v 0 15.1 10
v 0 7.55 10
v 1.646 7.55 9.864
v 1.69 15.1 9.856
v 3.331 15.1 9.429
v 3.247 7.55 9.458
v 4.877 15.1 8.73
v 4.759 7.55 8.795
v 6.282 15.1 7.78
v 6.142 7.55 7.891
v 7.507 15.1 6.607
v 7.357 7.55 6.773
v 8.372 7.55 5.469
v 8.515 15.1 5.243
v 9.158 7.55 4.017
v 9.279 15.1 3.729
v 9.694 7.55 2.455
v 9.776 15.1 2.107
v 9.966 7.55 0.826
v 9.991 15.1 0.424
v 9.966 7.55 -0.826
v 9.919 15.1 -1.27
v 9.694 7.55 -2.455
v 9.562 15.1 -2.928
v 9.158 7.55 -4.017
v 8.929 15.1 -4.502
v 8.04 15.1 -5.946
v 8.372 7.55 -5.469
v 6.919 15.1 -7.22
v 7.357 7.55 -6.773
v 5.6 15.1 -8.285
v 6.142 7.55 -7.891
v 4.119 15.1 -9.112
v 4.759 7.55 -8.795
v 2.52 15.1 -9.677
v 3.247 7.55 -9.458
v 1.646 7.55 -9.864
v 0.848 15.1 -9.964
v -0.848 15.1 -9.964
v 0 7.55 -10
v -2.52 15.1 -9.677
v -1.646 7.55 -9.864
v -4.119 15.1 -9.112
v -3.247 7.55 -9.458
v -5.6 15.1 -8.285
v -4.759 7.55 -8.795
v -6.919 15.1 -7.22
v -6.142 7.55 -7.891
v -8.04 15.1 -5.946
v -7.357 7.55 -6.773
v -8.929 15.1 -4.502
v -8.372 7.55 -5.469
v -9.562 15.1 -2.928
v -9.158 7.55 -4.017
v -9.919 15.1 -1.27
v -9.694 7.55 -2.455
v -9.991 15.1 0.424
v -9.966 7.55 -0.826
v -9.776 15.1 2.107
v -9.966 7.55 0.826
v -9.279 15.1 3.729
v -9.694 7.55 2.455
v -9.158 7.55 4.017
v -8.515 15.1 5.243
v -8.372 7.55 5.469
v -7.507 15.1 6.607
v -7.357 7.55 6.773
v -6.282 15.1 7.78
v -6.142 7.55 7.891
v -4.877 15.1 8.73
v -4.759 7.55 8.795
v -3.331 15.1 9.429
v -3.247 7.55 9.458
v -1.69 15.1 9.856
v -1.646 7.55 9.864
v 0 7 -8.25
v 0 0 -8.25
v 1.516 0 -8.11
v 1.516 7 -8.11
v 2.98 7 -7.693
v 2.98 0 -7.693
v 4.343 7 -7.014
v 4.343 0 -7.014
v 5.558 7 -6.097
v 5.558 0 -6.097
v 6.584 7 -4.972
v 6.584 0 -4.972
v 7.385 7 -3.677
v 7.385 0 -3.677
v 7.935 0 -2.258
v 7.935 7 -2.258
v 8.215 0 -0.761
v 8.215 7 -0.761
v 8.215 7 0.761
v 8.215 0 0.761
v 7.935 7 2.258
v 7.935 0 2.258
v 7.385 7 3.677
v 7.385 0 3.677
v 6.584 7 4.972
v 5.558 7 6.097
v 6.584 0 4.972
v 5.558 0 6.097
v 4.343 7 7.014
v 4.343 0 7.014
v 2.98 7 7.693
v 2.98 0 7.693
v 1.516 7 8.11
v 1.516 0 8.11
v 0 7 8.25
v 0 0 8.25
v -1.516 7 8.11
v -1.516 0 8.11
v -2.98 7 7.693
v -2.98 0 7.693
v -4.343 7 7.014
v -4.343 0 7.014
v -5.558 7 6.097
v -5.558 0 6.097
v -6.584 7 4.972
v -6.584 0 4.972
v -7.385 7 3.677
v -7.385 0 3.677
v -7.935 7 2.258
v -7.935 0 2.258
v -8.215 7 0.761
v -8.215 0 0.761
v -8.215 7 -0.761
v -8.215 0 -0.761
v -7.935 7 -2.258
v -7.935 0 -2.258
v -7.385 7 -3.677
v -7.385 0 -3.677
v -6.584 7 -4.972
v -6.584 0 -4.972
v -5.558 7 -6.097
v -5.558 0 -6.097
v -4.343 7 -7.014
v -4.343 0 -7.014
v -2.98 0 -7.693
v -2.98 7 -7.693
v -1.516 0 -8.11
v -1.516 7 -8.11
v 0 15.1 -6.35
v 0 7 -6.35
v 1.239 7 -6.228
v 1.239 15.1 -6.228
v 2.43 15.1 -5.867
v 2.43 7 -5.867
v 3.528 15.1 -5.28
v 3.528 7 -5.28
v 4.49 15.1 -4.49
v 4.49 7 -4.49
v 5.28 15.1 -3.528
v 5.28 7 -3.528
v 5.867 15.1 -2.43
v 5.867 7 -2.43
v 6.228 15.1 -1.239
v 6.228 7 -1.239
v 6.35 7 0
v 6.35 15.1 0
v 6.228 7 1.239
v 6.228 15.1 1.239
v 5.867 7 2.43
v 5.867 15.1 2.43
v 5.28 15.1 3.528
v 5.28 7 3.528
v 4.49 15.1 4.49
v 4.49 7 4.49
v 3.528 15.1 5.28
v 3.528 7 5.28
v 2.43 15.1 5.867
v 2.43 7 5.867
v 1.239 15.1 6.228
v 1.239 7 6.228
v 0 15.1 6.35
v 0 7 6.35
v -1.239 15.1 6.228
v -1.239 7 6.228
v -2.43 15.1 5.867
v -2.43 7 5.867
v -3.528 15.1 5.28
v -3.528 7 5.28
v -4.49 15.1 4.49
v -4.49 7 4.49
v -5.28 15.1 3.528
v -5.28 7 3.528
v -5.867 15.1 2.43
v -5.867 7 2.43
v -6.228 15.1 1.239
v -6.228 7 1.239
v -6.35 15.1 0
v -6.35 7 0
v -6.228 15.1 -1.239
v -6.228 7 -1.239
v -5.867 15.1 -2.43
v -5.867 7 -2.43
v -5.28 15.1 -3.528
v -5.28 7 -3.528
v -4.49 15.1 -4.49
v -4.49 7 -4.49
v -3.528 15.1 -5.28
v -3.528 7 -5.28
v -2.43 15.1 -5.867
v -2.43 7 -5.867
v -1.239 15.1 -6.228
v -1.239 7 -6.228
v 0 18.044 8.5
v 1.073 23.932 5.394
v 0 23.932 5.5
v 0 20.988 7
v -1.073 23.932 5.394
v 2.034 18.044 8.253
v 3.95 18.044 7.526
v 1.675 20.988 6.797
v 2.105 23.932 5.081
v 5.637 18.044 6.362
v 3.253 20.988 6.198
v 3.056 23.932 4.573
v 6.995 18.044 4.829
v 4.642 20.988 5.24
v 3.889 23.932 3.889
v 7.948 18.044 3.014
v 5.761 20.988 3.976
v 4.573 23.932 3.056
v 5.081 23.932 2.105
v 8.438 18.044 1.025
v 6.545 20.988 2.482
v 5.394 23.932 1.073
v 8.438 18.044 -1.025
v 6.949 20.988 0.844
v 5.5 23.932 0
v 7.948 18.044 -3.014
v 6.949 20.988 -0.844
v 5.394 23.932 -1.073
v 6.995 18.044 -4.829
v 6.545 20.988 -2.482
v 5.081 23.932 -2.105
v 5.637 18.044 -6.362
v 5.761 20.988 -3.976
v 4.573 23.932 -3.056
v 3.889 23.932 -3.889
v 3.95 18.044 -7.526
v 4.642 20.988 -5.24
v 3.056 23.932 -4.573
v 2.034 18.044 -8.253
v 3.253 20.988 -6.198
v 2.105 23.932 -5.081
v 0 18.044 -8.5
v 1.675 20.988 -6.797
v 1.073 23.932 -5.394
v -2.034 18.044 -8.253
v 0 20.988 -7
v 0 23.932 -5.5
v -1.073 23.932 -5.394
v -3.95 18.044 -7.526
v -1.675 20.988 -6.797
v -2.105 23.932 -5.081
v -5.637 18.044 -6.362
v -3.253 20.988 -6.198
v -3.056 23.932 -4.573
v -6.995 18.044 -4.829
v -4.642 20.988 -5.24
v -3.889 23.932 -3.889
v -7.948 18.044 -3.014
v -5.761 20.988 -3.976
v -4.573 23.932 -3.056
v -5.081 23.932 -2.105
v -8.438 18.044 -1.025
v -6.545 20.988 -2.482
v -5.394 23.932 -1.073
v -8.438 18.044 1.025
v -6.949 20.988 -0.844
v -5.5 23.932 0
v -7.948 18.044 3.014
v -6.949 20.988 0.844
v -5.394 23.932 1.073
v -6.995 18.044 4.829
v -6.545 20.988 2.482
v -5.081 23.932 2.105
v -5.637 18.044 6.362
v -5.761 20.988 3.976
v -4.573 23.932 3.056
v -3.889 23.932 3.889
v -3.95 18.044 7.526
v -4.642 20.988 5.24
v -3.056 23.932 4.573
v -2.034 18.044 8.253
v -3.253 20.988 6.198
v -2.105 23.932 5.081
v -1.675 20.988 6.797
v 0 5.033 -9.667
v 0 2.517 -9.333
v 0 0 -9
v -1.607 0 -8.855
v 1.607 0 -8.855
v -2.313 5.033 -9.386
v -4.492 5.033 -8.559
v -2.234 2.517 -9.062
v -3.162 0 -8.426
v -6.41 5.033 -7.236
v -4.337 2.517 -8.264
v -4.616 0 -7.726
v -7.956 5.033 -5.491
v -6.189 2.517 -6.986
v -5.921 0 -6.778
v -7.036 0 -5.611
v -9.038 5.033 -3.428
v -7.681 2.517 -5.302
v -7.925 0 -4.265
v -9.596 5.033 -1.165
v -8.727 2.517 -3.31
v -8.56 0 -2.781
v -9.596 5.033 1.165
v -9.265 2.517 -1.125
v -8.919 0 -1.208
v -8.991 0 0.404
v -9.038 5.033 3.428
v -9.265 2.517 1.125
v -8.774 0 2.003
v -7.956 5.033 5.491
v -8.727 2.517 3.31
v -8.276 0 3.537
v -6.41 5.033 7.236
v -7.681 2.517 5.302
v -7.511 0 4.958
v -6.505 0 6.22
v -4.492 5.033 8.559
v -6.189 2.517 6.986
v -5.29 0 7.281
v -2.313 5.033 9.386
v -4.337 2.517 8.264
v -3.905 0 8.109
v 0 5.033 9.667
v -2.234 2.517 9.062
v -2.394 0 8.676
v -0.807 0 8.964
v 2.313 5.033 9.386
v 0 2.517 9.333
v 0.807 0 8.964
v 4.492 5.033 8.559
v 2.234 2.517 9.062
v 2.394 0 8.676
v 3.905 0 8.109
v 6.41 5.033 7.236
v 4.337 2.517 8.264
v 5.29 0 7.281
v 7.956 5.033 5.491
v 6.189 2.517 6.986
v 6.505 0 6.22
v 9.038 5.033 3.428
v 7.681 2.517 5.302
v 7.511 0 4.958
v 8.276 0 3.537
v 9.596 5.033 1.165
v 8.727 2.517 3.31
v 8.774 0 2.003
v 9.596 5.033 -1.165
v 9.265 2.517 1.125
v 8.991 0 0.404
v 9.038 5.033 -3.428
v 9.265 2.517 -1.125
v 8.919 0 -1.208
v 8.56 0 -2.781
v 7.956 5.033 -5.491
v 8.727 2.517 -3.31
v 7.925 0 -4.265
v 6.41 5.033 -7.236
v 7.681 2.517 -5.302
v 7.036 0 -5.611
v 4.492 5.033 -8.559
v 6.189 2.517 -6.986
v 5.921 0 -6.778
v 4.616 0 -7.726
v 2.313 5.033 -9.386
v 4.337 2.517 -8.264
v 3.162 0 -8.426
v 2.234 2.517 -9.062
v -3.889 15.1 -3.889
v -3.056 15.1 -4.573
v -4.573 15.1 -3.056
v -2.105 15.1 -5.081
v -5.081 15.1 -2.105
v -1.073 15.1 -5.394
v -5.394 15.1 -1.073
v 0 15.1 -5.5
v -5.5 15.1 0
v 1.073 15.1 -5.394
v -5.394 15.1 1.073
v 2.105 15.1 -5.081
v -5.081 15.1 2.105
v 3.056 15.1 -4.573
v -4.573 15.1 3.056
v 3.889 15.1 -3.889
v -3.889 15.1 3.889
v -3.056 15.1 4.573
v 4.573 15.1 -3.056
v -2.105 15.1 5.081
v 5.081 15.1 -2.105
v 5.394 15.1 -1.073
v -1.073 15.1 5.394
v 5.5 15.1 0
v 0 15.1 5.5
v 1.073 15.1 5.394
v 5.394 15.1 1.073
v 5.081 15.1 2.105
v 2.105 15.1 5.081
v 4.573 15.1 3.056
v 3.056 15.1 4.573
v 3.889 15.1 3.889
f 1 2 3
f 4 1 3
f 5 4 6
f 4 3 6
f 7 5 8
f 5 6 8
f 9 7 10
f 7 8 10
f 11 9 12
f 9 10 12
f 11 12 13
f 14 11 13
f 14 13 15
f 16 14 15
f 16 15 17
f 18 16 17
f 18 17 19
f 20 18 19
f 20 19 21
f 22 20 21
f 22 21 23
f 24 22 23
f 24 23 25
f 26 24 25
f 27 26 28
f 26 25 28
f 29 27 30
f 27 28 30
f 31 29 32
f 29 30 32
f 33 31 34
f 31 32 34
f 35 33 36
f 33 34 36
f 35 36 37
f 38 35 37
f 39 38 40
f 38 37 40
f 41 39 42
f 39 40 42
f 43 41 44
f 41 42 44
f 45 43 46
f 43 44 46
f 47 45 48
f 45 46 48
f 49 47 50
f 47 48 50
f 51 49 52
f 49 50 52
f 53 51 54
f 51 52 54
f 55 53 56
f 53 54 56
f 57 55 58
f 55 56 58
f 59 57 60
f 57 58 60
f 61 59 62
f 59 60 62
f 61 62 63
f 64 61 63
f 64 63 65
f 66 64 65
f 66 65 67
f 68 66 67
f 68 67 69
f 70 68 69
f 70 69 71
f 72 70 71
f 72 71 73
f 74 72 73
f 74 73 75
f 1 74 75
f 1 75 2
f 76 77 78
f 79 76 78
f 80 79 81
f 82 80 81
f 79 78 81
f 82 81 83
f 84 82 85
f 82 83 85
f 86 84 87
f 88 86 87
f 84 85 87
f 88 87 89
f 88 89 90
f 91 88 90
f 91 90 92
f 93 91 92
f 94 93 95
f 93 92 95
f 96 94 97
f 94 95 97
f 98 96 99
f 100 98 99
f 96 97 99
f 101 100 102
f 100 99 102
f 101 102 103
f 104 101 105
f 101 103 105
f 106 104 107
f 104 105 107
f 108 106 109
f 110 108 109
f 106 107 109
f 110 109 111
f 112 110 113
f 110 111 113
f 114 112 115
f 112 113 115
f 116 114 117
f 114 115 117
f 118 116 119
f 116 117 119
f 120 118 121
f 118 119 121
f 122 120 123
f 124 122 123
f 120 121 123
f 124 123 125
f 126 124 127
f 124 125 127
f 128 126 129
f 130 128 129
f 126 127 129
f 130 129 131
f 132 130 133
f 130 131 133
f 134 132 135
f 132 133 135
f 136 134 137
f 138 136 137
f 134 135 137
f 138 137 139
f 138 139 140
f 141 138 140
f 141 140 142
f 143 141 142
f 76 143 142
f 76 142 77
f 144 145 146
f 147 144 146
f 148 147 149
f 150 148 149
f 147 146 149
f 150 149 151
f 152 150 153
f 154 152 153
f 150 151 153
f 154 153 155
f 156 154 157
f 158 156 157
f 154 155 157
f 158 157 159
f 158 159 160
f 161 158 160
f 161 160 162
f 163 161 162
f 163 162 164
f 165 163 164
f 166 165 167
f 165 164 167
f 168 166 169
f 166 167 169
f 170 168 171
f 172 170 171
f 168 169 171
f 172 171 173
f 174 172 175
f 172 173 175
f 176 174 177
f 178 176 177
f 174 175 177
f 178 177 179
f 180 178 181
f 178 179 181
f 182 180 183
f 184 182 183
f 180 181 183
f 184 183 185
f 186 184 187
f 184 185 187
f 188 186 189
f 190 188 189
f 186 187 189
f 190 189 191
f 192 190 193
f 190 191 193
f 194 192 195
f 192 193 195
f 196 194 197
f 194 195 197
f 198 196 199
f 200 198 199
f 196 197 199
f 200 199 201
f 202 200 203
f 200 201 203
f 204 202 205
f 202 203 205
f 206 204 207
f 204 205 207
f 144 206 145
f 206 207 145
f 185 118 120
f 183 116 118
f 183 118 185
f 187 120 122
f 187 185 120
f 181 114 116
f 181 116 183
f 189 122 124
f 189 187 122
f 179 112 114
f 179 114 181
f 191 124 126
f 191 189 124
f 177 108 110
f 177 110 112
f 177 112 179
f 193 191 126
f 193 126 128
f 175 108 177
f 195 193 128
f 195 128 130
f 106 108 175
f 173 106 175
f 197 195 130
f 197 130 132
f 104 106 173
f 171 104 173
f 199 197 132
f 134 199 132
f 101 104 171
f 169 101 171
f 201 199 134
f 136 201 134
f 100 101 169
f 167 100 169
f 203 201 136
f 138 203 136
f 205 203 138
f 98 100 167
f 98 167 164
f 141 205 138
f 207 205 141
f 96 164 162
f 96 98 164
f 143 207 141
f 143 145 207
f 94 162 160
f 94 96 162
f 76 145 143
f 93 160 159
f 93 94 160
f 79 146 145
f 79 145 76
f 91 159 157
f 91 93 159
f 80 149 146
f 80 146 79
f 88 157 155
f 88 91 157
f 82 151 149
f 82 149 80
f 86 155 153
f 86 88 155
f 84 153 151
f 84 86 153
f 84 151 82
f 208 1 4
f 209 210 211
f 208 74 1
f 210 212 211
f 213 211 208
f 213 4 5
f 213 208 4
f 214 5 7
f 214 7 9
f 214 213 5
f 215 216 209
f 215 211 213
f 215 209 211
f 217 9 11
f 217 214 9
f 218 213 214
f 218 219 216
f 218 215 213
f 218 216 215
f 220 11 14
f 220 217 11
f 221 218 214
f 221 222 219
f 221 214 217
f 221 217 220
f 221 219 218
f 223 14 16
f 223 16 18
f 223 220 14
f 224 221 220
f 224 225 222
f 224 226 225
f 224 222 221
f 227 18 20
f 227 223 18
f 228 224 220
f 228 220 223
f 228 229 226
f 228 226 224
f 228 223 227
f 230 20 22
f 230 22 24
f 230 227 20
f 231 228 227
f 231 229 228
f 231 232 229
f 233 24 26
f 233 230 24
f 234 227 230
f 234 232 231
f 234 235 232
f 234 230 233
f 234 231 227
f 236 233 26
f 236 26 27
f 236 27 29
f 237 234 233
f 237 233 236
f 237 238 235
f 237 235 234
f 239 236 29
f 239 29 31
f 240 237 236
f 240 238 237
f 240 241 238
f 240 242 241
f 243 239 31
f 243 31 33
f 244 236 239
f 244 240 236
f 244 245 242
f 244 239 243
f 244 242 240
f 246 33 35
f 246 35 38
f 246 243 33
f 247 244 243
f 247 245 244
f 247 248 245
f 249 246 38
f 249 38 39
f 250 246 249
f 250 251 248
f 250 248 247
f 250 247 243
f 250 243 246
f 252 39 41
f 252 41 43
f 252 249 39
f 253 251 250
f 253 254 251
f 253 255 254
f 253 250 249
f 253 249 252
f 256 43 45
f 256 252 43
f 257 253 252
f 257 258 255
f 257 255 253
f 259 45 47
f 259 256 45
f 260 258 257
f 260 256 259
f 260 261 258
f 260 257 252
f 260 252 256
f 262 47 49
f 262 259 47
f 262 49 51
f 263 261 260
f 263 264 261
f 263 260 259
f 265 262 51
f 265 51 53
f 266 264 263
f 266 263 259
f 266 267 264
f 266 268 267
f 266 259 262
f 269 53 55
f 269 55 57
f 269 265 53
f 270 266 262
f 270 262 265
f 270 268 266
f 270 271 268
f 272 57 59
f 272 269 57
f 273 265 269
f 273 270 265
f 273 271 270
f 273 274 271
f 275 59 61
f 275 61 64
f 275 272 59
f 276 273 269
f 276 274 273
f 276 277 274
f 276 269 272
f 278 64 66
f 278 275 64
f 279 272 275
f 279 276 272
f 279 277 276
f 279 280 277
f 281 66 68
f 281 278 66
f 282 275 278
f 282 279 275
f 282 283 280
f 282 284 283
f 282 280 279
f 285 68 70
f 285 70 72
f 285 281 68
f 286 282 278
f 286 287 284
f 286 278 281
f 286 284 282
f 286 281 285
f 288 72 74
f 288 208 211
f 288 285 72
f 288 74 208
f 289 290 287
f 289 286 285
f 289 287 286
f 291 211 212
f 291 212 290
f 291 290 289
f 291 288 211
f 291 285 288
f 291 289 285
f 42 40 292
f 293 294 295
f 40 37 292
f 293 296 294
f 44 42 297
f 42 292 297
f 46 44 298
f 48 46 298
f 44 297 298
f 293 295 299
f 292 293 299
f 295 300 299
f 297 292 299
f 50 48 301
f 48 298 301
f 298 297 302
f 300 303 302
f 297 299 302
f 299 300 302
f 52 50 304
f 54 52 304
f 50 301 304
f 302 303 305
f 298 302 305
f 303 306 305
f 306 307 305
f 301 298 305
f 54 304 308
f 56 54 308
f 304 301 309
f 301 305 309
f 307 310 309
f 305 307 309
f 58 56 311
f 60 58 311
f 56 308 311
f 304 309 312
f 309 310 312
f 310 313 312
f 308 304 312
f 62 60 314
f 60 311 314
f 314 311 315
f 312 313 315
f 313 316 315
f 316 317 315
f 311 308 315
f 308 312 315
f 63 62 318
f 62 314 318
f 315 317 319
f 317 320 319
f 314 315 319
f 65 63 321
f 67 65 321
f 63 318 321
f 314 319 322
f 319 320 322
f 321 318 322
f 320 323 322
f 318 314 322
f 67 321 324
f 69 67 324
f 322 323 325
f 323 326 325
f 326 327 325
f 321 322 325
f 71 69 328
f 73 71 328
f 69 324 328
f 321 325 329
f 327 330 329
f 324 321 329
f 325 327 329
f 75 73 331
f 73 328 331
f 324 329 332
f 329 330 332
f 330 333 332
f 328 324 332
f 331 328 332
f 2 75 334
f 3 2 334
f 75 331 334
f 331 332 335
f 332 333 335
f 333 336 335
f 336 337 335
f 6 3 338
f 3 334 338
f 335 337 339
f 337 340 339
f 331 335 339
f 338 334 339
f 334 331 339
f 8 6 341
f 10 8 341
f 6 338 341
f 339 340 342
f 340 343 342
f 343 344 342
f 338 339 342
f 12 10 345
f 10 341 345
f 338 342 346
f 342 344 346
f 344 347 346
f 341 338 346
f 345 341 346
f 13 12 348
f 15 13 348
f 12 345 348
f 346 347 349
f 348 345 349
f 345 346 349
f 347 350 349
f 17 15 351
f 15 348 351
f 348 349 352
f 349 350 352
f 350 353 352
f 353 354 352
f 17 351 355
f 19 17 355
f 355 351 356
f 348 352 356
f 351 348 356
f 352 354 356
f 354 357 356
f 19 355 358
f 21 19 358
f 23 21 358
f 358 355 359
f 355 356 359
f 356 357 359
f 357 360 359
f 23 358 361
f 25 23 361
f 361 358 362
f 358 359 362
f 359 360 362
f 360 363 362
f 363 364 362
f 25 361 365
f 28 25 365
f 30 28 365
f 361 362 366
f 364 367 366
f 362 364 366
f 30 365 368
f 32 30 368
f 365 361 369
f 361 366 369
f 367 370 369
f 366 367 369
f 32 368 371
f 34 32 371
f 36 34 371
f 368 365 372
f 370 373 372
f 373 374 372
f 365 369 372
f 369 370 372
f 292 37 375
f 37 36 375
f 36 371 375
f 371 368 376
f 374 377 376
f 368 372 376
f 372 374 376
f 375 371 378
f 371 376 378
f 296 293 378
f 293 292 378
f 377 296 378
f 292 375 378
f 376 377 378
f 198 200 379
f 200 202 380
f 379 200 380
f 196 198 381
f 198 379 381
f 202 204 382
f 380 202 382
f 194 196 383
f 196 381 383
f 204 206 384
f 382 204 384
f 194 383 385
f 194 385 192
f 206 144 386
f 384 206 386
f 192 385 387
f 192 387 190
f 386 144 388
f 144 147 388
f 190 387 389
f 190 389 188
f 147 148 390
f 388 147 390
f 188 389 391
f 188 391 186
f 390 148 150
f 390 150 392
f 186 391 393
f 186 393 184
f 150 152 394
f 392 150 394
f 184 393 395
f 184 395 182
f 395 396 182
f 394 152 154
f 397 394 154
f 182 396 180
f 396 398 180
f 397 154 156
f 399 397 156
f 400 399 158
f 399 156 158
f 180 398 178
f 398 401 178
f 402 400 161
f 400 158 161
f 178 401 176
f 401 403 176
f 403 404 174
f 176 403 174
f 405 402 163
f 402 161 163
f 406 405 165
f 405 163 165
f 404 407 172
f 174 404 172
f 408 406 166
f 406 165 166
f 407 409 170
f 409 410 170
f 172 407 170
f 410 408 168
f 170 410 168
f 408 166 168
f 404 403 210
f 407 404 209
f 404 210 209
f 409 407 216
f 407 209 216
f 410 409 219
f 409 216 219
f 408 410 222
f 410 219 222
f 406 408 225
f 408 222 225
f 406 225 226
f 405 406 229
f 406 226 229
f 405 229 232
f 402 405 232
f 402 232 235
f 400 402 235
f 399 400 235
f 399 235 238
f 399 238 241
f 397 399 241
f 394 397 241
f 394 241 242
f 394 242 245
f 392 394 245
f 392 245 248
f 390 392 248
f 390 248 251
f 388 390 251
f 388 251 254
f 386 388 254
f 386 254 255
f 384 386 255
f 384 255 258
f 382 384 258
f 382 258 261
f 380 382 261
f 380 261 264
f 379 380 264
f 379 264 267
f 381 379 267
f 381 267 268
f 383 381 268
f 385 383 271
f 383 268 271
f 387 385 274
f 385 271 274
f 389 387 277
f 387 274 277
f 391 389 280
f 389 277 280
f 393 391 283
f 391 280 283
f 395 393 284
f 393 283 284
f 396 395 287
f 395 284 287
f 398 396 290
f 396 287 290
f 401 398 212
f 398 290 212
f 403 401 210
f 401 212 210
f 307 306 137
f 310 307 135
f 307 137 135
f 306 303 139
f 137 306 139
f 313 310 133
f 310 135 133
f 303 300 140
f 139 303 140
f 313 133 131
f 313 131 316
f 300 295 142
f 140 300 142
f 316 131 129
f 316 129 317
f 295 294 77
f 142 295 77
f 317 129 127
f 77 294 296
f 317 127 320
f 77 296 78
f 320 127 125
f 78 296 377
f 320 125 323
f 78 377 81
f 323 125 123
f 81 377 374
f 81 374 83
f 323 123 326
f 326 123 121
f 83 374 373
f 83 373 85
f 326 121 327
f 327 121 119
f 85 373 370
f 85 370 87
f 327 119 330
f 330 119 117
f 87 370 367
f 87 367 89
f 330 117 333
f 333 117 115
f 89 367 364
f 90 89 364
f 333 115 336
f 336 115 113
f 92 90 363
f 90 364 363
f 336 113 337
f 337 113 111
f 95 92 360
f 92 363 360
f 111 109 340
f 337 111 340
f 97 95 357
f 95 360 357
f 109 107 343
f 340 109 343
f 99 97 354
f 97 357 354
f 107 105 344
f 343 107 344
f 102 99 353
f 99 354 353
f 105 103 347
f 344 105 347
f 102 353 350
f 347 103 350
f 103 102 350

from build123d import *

# Parameters (mm, degrees)
SKETCH1_R           = 10
BOSS_EXTRUDE1_DEPTH = 15.1
SKETCH2_R           = 8.25
CUT_EXTRUDE1_DEPTH  = 7
SKETCH3_R           = 6.35
CUT_EXTRUDE2_DEPTH  = 8.1
SKETCH7_R           = 10
BOSS_EXTRUDE2_DEPTH = 10
BOSS_EXTRUDE2_TAPER = 27
SKETCH8_R           = 5.5
CUT_EXTRUDE3_DEPTH  = 10


with BuildPart() as part:
    # Sketch1 → Boss-Extrude1 (new body)
    with BuildSketch(Plane(origin=(0, 0, 0), x_dir=(1, 0, 0), z_dir=(0, 1, 0))):
        with Locations(Location((0, 0, 0), (0, 0, 270))):
            Circle(SKETCH1_R)
    extrude(amount=BOSS_EXTRUDE1_DEPTH)

    # Sketch2 → Cut-Extrude1 (cut)
    with BuildSketch(Plane(origin=(0, 0, 0), x_dir=(-1, 0, 0), z_dir=(0, -1, 0))):
        with Locations(Location((0, 0, 0), (0, 0, 90))):
            Circle(SKETCH2_R)
    extrude(amount=-CUT_EXTRUDE1_DEPTH, mode=Mode.SUBTRACT)

    # Sketch3 → Cut-Extrude2 (cut)
    with BuildSketch(Plane.XZ.offset(-7)):
        with Locations(Location((0, 0, 0), (0, 0, 270))):
            Circle(SKETCH3_R)
    extrude(amount=-CUT_EXTRUDE2_DEPTH, mode=Mode.SUBTRACT)

    # Sketch7 → Boss-Extrude2 (add)
    with BuildSketch(Plane(origin=(0, 15.1, 0), x_dir=(1, 0, 0), z_dir=(0, 1, 0))):
        with Locations(Location((0, 0, 0), (0, 0, 270))):
            Circle(SKETCH7_R)
    extrude(amount=BOSS_EXTRUDE2_DEPTH, taper=BOSS_EXTRUDE2_TAPER)

    # Sketch8 → Cut-Extrude3 (cut)
    with BuildSketch(Plane(origin=(0, 25.1, 0), x_dir=(1, 0, 0), z_dir=(0, 1, 0))):
        with Locations(Location((0, 0, 0), (0, 0, 270))):
            Circle(SKETCH8_R)
    extrude(amount=-CUT_EXTRUDE3_DEPTH, mode=Mode.SUBTRACT)

    # Sketch9 → Cut-Revolve1 (revolve, cut)
    with BuildSketch(Plane.XY, mode=Mode.PRIVATE) as cut_revolve1_sk:
        Polygon((10, 0), (10, 7.55), (9, 0), align=None)
    revolve(cut_revolve1_sk.sketch.rotate(Axis((0, -5.35411367, 0), (0, 1, 0)), 90), axis=Axis((0, -5.35411367, 0), (0, 1, 0)), mode=Mode.SUBTRACT)


solid = part.part
